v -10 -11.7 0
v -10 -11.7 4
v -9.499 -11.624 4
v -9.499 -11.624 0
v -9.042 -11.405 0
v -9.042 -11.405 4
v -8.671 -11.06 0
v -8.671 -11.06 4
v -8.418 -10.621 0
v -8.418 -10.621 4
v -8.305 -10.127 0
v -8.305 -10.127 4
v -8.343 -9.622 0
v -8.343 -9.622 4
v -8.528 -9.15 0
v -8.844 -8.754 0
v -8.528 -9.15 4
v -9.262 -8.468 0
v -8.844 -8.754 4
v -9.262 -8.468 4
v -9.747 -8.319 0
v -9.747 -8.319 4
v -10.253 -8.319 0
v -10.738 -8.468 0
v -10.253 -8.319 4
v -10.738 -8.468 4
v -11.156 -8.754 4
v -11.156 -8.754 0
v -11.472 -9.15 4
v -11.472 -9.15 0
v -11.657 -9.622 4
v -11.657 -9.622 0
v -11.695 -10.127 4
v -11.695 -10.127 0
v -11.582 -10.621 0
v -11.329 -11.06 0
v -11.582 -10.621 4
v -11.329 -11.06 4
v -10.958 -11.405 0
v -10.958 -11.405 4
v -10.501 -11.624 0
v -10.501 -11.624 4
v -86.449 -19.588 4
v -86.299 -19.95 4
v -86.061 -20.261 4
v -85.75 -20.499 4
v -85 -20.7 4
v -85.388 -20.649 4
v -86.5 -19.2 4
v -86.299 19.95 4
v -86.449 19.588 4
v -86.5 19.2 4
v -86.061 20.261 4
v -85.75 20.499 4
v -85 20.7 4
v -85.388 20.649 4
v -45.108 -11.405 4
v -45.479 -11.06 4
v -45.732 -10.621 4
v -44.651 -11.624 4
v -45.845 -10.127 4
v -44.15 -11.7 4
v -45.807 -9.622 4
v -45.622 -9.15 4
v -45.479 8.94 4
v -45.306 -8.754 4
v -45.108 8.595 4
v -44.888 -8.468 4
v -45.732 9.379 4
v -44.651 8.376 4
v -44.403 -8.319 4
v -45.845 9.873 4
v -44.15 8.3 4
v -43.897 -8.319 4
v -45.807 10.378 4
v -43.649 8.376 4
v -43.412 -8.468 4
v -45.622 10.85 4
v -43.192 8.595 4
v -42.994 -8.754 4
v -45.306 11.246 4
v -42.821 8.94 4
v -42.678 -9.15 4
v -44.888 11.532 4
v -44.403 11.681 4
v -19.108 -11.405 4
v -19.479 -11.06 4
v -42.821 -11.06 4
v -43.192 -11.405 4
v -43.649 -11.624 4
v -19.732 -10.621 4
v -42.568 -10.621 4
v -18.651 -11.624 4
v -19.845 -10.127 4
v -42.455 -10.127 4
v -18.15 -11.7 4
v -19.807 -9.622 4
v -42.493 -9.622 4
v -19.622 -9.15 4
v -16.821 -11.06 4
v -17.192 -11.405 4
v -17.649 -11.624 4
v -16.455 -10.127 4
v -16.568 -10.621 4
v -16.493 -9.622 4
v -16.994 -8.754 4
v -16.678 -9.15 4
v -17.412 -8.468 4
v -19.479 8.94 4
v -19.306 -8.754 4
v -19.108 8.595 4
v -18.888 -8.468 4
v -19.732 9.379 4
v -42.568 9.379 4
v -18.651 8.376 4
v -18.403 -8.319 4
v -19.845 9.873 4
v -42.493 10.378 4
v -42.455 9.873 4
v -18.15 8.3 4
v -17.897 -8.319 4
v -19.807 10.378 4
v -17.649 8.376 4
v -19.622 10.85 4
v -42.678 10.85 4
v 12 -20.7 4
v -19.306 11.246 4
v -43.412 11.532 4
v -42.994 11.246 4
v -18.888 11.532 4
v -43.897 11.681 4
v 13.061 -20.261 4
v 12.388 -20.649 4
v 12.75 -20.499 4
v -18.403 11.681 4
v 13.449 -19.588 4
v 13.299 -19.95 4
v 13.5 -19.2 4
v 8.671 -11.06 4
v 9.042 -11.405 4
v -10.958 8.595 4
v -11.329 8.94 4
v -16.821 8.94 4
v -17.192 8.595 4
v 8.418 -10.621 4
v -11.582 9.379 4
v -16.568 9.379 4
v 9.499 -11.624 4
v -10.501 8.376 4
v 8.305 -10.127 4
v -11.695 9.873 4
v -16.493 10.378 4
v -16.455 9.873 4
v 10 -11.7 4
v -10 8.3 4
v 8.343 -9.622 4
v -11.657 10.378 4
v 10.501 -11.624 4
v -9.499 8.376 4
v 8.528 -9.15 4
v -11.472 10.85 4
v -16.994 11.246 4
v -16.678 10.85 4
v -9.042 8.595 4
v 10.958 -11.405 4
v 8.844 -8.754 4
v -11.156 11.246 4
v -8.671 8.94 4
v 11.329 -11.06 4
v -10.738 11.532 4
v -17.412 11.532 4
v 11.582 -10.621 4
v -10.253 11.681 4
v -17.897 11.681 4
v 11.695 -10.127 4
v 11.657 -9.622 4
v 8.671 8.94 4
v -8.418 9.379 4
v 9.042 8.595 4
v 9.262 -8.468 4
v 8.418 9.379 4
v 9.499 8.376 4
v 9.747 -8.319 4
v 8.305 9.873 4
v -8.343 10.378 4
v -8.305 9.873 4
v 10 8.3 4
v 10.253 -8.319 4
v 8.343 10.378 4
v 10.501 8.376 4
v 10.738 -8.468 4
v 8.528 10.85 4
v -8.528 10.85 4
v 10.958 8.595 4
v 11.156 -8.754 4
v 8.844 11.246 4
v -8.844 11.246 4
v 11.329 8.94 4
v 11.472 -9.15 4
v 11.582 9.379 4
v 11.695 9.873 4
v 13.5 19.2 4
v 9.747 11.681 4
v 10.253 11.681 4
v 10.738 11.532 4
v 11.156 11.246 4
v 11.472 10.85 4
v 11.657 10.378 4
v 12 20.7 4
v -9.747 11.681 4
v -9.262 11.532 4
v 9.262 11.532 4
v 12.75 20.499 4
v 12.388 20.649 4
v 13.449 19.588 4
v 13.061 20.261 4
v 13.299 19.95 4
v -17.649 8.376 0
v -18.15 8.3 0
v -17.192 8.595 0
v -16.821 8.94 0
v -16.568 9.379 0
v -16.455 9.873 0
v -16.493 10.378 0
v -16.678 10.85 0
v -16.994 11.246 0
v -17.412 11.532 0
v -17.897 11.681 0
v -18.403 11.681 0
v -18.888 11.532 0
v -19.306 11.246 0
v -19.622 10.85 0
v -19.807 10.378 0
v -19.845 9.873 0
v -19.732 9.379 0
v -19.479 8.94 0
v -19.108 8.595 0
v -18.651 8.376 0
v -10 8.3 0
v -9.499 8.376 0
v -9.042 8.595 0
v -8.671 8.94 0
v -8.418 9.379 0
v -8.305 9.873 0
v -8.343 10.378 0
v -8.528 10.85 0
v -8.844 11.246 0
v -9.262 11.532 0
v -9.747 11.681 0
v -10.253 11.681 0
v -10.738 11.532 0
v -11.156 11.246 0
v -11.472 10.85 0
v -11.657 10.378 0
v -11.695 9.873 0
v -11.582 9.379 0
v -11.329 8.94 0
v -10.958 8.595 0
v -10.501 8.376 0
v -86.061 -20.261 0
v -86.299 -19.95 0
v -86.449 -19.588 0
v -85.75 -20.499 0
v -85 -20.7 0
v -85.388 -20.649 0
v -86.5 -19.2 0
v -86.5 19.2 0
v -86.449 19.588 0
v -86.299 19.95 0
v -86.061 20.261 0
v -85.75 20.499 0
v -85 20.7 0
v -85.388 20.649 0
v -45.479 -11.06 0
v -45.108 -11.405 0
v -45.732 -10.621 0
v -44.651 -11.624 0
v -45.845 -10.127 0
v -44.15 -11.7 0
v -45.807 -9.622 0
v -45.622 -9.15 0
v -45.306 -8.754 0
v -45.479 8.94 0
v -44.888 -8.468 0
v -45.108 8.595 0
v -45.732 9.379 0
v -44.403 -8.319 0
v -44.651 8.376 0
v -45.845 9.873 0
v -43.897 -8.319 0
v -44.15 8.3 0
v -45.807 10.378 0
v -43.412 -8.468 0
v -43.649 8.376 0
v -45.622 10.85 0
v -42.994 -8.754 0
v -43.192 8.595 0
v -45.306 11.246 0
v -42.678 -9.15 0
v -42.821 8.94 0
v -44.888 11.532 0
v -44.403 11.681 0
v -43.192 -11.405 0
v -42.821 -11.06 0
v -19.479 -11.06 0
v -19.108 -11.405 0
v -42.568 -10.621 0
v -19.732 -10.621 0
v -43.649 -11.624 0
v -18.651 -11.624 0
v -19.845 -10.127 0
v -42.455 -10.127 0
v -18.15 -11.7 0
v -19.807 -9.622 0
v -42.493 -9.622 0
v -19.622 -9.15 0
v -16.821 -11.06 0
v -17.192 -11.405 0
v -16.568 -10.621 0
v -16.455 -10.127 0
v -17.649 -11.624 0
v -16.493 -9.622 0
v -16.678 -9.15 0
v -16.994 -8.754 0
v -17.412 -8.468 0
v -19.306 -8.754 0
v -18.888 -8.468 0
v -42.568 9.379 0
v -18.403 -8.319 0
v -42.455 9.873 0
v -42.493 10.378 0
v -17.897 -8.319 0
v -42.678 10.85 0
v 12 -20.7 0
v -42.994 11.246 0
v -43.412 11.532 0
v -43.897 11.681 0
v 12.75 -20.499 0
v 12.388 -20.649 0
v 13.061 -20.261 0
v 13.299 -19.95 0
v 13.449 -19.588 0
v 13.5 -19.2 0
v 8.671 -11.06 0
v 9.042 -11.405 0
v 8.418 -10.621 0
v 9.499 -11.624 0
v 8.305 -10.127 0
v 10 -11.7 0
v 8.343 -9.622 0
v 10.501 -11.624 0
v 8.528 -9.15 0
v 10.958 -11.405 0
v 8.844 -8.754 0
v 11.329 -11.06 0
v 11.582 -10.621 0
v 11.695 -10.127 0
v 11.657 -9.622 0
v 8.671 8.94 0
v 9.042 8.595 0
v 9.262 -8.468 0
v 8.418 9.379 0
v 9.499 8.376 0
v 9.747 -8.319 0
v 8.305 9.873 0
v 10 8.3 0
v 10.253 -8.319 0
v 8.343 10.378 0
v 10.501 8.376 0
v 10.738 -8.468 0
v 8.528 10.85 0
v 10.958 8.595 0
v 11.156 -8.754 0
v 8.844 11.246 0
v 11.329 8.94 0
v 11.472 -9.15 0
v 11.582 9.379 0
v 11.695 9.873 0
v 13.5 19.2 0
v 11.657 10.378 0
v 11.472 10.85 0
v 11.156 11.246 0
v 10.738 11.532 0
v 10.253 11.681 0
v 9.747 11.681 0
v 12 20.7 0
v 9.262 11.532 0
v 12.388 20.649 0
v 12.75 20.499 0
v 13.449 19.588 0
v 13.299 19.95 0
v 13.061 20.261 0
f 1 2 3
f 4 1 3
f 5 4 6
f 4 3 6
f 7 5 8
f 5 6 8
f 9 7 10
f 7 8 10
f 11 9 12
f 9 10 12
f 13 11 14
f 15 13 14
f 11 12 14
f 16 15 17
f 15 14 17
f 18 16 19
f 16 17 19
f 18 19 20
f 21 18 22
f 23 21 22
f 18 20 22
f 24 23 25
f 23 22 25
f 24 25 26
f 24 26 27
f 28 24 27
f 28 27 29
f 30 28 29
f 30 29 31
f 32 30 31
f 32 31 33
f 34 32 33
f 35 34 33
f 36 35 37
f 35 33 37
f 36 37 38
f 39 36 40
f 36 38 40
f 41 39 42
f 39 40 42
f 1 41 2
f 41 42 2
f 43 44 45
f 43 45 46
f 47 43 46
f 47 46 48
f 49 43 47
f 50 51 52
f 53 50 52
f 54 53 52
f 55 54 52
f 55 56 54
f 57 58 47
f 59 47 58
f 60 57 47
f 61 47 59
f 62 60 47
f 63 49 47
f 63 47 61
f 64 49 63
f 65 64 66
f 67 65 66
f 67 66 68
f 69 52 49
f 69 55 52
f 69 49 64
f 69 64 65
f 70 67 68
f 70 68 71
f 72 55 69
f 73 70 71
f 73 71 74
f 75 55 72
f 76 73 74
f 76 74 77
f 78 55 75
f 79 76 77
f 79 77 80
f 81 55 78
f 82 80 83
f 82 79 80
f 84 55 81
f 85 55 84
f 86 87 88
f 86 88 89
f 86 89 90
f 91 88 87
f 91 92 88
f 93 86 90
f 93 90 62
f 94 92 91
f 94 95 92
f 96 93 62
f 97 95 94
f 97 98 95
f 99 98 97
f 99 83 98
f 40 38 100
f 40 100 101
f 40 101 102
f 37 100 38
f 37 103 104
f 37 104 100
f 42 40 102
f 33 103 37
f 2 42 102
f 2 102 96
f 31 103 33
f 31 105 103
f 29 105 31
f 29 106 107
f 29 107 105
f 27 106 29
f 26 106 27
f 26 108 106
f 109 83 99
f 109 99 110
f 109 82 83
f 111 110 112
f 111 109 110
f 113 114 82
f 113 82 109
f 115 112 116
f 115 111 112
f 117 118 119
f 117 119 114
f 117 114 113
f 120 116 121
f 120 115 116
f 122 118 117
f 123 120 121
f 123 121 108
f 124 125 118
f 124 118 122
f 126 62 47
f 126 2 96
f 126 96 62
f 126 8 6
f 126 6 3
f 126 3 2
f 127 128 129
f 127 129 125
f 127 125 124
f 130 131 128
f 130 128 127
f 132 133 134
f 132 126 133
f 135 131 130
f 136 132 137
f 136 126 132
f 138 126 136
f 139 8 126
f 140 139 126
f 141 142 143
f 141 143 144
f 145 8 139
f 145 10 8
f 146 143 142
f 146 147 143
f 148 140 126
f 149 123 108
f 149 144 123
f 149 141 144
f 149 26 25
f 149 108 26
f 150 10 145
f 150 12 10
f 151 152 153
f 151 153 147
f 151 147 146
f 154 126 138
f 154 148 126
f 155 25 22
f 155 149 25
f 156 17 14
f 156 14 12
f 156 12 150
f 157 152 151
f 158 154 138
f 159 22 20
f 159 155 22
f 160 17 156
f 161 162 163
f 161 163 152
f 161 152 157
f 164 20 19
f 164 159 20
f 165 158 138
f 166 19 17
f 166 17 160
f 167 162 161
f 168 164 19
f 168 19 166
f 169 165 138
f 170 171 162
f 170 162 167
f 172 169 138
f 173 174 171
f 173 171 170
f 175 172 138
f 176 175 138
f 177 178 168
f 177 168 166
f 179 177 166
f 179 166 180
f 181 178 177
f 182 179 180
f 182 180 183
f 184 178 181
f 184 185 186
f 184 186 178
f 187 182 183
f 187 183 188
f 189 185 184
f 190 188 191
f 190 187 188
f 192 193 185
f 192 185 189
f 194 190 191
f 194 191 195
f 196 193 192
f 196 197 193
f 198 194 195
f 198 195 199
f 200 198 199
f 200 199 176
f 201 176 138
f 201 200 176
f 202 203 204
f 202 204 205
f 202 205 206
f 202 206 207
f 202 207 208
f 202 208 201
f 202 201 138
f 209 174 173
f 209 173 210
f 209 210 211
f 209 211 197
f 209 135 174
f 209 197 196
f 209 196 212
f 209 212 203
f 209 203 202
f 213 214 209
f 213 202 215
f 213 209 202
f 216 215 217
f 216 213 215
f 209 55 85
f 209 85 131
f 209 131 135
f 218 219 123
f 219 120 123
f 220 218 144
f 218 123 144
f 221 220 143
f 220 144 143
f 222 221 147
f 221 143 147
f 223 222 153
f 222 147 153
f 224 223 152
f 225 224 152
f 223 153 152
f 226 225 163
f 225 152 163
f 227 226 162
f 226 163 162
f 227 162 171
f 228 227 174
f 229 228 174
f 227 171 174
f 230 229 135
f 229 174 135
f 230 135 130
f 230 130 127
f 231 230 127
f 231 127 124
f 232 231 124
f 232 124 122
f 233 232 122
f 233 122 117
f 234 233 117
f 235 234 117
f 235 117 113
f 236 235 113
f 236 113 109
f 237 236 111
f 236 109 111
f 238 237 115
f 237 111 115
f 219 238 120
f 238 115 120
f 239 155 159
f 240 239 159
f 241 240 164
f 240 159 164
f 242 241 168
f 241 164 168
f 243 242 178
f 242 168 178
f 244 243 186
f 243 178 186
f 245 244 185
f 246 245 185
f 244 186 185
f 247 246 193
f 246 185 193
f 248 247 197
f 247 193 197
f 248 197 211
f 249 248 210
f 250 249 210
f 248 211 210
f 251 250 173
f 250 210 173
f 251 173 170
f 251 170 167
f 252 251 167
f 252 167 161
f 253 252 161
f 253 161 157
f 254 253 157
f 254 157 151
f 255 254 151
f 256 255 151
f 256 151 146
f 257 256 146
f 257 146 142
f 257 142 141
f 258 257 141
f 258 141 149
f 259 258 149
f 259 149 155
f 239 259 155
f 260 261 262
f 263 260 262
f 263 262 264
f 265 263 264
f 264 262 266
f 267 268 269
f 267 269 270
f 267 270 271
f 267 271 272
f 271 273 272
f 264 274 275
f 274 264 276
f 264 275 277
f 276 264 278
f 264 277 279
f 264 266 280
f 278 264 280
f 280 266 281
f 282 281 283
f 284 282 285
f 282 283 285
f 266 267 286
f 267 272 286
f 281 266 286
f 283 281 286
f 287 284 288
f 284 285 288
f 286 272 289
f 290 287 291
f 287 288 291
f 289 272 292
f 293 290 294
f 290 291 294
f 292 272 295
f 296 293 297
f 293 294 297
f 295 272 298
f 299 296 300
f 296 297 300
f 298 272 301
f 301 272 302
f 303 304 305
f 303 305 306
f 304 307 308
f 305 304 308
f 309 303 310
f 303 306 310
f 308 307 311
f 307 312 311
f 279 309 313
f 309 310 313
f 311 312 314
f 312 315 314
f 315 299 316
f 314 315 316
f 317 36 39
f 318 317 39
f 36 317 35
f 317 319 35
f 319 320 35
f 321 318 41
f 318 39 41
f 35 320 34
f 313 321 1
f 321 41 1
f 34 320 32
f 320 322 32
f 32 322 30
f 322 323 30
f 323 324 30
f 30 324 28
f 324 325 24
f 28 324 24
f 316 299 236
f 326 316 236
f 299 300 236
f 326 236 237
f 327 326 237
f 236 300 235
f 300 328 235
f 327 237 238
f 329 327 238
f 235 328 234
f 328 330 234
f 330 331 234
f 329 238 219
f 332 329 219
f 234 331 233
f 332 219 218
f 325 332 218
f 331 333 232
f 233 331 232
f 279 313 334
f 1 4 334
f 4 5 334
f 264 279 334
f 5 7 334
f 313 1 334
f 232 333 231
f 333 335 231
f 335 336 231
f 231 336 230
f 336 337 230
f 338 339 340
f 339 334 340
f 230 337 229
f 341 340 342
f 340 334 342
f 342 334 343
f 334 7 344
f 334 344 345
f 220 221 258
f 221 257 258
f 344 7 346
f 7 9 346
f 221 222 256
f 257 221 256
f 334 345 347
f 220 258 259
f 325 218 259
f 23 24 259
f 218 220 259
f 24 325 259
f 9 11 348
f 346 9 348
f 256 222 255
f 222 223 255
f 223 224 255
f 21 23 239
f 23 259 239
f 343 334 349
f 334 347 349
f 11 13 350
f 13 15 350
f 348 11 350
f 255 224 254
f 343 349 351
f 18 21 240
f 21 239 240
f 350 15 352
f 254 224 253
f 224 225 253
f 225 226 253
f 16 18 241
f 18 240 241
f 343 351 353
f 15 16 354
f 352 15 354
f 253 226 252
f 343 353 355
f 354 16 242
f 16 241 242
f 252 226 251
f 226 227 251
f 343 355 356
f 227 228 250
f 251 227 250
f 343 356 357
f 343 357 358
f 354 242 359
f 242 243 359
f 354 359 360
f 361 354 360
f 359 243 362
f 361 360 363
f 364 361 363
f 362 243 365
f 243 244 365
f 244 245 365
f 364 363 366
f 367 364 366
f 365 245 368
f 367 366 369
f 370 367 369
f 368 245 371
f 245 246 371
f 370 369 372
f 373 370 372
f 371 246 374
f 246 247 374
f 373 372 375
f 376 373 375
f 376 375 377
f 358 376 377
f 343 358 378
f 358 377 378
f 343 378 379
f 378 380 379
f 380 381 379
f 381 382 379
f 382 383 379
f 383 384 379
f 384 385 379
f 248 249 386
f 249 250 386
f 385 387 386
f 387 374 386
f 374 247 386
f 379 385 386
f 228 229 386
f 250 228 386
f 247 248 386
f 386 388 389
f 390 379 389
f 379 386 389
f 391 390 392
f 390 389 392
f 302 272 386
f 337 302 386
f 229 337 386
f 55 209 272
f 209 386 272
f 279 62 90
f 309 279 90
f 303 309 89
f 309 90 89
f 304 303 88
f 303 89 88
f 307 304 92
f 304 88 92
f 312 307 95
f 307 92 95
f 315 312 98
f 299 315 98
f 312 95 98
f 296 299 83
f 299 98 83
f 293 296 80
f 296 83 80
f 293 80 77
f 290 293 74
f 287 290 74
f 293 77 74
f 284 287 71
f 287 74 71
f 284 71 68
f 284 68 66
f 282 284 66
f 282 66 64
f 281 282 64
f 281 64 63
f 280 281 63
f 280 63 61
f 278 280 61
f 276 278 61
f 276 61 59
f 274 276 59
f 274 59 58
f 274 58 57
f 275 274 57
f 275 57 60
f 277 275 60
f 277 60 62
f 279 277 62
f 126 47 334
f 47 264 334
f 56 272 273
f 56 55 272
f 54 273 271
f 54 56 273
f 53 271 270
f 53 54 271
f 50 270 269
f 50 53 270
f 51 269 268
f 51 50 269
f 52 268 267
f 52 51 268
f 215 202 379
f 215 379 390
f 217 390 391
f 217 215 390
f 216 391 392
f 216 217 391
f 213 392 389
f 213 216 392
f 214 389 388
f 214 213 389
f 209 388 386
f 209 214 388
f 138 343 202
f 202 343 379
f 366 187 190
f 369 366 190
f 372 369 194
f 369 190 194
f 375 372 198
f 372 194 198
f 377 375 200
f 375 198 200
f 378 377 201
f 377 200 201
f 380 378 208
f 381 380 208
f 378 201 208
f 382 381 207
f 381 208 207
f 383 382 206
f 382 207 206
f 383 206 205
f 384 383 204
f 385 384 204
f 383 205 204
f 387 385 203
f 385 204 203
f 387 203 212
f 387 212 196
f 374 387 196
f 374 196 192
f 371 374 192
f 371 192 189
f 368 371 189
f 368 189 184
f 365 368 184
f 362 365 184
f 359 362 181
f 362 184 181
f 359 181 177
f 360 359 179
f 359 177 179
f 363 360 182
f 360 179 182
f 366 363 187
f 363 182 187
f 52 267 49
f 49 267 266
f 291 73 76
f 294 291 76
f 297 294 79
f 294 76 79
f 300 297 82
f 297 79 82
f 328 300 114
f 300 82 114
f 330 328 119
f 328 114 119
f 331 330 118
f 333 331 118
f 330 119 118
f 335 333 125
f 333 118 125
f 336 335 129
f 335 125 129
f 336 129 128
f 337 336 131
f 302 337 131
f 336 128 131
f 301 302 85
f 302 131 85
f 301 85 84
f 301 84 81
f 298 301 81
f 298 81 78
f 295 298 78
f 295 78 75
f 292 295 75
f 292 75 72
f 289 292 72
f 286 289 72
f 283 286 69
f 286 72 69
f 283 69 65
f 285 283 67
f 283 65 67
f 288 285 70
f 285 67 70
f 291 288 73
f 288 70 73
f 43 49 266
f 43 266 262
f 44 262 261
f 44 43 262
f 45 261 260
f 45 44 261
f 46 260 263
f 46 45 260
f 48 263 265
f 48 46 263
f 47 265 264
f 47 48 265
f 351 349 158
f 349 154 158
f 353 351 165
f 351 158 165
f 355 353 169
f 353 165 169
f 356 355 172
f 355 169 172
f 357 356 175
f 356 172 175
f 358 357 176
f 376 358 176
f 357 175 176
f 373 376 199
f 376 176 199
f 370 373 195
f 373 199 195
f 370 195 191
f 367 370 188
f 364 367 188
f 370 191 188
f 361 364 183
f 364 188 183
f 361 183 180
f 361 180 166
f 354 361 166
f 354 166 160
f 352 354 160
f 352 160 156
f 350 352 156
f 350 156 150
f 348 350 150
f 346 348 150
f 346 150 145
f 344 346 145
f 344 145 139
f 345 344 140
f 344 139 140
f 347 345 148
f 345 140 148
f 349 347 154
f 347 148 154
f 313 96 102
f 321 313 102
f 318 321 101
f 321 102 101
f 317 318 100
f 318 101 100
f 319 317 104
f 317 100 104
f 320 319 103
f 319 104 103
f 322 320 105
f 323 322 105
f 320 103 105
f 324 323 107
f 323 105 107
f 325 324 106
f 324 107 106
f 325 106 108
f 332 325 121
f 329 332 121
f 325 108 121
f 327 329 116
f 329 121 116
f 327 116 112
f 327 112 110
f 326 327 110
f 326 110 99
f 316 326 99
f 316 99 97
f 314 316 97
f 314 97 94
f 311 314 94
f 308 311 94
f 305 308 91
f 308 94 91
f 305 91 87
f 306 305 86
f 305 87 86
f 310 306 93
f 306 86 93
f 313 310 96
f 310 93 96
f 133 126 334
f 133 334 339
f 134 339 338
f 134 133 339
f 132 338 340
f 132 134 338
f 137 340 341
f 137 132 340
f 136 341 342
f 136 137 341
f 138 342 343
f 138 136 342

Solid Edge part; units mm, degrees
sketch "Sketch1" plane through (0, 0, 0) normal (0, 0, 1) x (1, 0, 0)
  line L0 (13.5, 20.7) -> (-86.5, 20.7)
  line L1 (-86.5, 20.7) -> (-86.5, -20.7)
  line L2 (-86.5, -20.7) -> (13.5, -20.7)
  line L3 (13.5, -20.7) -> (13.5, 20.7)
  dimension "D1" = 2
extrude "Protrusion1" add sketch "Sketch1" along normal blind 4
hole "Hole_1" at (-10, 10, 4) direction (0, 0, -1) diameter 3.4 end up to next
pattern_linear "Pattern1" count 2 spacing 20 along (1, 0, 0) count 2 spacing 20 along (0, -1, 0) of "Hole_1"
fillet "Round_1" radius 1.5 4 edges at (13.5, 20.7, 2) (13.5, -20.7, 2) (-86.5, -20.7, 2) (-86.5, 20.7, 2)
hole "Hole_2" at (-44.15, 10, 4) direction (0, 0, -1) diameter 3.4 end up to next
pattern_linear "Pattern3" count 2 spacing 20 along (0, -1, 0) count 2 spacing 26 along (1, 0, 0) of "Hole_2"
properties material "Aluminum, 6061-T6"
